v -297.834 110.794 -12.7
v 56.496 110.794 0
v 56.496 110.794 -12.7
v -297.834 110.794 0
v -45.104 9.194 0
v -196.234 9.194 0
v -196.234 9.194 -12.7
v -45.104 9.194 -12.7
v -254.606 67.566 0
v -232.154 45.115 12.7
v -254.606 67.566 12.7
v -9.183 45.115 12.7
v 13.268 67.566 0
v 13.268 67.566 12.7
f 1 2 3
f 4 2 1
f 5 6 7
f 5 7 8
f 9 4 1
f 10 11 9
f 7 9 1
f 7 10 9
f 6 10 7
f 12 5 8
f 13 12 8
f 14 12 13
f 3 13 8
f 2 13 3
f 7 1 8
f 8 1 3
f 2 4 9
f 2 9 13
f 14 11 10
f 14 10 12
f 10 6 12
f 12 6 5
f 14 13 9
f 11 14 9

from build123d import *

# Parameters (mm, degrees)
F1_DEPTH = 12.7
F2_DEPTH = 12.7
F3_SIZE2 = 12.7
F3_SIZE  = 35.92068


with BuildPart() as f1:
    # F0 (on Top) → F1 (new body)
    with BuildSketch(Plane.XY):
        Polygon((-254.6055446911, 67.5657510931), (-196.2338046911, 9.1940110931), (-45.1038046911, 9.1940110931), (13.2679353089, 67.5657510931), align=None)
    extrude(amount=F1_DEPTH)

    # F0 (on Top) → F2 (join)
    with BuildSketch(Plane.XY):
        Polygon((-254.6055446911, 67.5657510931), (-196.2338046911, 9.1940110931), (-45.1038046911, 9.1940110931), (13.2679353089, 67.5657510931), align=None)
        Polygon((-297.8338046911, 110.7940110931), (-254.6055446911, 67.5657510931), (13.2679353089, 67.5657510931), (56.4961953089, 110.7940110931), align=None)
    extrude(amount=-F2_DEPTH)

    # F3
    f3_edges = [f1.edges().sort_by_distance(p)[0] for p in [
        (-120.668805, 9.194011, 12.7),
    ]]
    f3_side = f1.faces().sort_by_distance((-120.668805, 41.090487, 12.7))[0]
    chamfer(f3_edges, length=F3_SIZE, length2=F3_SIZE2, reference=f3_side)


solid = f1.part
